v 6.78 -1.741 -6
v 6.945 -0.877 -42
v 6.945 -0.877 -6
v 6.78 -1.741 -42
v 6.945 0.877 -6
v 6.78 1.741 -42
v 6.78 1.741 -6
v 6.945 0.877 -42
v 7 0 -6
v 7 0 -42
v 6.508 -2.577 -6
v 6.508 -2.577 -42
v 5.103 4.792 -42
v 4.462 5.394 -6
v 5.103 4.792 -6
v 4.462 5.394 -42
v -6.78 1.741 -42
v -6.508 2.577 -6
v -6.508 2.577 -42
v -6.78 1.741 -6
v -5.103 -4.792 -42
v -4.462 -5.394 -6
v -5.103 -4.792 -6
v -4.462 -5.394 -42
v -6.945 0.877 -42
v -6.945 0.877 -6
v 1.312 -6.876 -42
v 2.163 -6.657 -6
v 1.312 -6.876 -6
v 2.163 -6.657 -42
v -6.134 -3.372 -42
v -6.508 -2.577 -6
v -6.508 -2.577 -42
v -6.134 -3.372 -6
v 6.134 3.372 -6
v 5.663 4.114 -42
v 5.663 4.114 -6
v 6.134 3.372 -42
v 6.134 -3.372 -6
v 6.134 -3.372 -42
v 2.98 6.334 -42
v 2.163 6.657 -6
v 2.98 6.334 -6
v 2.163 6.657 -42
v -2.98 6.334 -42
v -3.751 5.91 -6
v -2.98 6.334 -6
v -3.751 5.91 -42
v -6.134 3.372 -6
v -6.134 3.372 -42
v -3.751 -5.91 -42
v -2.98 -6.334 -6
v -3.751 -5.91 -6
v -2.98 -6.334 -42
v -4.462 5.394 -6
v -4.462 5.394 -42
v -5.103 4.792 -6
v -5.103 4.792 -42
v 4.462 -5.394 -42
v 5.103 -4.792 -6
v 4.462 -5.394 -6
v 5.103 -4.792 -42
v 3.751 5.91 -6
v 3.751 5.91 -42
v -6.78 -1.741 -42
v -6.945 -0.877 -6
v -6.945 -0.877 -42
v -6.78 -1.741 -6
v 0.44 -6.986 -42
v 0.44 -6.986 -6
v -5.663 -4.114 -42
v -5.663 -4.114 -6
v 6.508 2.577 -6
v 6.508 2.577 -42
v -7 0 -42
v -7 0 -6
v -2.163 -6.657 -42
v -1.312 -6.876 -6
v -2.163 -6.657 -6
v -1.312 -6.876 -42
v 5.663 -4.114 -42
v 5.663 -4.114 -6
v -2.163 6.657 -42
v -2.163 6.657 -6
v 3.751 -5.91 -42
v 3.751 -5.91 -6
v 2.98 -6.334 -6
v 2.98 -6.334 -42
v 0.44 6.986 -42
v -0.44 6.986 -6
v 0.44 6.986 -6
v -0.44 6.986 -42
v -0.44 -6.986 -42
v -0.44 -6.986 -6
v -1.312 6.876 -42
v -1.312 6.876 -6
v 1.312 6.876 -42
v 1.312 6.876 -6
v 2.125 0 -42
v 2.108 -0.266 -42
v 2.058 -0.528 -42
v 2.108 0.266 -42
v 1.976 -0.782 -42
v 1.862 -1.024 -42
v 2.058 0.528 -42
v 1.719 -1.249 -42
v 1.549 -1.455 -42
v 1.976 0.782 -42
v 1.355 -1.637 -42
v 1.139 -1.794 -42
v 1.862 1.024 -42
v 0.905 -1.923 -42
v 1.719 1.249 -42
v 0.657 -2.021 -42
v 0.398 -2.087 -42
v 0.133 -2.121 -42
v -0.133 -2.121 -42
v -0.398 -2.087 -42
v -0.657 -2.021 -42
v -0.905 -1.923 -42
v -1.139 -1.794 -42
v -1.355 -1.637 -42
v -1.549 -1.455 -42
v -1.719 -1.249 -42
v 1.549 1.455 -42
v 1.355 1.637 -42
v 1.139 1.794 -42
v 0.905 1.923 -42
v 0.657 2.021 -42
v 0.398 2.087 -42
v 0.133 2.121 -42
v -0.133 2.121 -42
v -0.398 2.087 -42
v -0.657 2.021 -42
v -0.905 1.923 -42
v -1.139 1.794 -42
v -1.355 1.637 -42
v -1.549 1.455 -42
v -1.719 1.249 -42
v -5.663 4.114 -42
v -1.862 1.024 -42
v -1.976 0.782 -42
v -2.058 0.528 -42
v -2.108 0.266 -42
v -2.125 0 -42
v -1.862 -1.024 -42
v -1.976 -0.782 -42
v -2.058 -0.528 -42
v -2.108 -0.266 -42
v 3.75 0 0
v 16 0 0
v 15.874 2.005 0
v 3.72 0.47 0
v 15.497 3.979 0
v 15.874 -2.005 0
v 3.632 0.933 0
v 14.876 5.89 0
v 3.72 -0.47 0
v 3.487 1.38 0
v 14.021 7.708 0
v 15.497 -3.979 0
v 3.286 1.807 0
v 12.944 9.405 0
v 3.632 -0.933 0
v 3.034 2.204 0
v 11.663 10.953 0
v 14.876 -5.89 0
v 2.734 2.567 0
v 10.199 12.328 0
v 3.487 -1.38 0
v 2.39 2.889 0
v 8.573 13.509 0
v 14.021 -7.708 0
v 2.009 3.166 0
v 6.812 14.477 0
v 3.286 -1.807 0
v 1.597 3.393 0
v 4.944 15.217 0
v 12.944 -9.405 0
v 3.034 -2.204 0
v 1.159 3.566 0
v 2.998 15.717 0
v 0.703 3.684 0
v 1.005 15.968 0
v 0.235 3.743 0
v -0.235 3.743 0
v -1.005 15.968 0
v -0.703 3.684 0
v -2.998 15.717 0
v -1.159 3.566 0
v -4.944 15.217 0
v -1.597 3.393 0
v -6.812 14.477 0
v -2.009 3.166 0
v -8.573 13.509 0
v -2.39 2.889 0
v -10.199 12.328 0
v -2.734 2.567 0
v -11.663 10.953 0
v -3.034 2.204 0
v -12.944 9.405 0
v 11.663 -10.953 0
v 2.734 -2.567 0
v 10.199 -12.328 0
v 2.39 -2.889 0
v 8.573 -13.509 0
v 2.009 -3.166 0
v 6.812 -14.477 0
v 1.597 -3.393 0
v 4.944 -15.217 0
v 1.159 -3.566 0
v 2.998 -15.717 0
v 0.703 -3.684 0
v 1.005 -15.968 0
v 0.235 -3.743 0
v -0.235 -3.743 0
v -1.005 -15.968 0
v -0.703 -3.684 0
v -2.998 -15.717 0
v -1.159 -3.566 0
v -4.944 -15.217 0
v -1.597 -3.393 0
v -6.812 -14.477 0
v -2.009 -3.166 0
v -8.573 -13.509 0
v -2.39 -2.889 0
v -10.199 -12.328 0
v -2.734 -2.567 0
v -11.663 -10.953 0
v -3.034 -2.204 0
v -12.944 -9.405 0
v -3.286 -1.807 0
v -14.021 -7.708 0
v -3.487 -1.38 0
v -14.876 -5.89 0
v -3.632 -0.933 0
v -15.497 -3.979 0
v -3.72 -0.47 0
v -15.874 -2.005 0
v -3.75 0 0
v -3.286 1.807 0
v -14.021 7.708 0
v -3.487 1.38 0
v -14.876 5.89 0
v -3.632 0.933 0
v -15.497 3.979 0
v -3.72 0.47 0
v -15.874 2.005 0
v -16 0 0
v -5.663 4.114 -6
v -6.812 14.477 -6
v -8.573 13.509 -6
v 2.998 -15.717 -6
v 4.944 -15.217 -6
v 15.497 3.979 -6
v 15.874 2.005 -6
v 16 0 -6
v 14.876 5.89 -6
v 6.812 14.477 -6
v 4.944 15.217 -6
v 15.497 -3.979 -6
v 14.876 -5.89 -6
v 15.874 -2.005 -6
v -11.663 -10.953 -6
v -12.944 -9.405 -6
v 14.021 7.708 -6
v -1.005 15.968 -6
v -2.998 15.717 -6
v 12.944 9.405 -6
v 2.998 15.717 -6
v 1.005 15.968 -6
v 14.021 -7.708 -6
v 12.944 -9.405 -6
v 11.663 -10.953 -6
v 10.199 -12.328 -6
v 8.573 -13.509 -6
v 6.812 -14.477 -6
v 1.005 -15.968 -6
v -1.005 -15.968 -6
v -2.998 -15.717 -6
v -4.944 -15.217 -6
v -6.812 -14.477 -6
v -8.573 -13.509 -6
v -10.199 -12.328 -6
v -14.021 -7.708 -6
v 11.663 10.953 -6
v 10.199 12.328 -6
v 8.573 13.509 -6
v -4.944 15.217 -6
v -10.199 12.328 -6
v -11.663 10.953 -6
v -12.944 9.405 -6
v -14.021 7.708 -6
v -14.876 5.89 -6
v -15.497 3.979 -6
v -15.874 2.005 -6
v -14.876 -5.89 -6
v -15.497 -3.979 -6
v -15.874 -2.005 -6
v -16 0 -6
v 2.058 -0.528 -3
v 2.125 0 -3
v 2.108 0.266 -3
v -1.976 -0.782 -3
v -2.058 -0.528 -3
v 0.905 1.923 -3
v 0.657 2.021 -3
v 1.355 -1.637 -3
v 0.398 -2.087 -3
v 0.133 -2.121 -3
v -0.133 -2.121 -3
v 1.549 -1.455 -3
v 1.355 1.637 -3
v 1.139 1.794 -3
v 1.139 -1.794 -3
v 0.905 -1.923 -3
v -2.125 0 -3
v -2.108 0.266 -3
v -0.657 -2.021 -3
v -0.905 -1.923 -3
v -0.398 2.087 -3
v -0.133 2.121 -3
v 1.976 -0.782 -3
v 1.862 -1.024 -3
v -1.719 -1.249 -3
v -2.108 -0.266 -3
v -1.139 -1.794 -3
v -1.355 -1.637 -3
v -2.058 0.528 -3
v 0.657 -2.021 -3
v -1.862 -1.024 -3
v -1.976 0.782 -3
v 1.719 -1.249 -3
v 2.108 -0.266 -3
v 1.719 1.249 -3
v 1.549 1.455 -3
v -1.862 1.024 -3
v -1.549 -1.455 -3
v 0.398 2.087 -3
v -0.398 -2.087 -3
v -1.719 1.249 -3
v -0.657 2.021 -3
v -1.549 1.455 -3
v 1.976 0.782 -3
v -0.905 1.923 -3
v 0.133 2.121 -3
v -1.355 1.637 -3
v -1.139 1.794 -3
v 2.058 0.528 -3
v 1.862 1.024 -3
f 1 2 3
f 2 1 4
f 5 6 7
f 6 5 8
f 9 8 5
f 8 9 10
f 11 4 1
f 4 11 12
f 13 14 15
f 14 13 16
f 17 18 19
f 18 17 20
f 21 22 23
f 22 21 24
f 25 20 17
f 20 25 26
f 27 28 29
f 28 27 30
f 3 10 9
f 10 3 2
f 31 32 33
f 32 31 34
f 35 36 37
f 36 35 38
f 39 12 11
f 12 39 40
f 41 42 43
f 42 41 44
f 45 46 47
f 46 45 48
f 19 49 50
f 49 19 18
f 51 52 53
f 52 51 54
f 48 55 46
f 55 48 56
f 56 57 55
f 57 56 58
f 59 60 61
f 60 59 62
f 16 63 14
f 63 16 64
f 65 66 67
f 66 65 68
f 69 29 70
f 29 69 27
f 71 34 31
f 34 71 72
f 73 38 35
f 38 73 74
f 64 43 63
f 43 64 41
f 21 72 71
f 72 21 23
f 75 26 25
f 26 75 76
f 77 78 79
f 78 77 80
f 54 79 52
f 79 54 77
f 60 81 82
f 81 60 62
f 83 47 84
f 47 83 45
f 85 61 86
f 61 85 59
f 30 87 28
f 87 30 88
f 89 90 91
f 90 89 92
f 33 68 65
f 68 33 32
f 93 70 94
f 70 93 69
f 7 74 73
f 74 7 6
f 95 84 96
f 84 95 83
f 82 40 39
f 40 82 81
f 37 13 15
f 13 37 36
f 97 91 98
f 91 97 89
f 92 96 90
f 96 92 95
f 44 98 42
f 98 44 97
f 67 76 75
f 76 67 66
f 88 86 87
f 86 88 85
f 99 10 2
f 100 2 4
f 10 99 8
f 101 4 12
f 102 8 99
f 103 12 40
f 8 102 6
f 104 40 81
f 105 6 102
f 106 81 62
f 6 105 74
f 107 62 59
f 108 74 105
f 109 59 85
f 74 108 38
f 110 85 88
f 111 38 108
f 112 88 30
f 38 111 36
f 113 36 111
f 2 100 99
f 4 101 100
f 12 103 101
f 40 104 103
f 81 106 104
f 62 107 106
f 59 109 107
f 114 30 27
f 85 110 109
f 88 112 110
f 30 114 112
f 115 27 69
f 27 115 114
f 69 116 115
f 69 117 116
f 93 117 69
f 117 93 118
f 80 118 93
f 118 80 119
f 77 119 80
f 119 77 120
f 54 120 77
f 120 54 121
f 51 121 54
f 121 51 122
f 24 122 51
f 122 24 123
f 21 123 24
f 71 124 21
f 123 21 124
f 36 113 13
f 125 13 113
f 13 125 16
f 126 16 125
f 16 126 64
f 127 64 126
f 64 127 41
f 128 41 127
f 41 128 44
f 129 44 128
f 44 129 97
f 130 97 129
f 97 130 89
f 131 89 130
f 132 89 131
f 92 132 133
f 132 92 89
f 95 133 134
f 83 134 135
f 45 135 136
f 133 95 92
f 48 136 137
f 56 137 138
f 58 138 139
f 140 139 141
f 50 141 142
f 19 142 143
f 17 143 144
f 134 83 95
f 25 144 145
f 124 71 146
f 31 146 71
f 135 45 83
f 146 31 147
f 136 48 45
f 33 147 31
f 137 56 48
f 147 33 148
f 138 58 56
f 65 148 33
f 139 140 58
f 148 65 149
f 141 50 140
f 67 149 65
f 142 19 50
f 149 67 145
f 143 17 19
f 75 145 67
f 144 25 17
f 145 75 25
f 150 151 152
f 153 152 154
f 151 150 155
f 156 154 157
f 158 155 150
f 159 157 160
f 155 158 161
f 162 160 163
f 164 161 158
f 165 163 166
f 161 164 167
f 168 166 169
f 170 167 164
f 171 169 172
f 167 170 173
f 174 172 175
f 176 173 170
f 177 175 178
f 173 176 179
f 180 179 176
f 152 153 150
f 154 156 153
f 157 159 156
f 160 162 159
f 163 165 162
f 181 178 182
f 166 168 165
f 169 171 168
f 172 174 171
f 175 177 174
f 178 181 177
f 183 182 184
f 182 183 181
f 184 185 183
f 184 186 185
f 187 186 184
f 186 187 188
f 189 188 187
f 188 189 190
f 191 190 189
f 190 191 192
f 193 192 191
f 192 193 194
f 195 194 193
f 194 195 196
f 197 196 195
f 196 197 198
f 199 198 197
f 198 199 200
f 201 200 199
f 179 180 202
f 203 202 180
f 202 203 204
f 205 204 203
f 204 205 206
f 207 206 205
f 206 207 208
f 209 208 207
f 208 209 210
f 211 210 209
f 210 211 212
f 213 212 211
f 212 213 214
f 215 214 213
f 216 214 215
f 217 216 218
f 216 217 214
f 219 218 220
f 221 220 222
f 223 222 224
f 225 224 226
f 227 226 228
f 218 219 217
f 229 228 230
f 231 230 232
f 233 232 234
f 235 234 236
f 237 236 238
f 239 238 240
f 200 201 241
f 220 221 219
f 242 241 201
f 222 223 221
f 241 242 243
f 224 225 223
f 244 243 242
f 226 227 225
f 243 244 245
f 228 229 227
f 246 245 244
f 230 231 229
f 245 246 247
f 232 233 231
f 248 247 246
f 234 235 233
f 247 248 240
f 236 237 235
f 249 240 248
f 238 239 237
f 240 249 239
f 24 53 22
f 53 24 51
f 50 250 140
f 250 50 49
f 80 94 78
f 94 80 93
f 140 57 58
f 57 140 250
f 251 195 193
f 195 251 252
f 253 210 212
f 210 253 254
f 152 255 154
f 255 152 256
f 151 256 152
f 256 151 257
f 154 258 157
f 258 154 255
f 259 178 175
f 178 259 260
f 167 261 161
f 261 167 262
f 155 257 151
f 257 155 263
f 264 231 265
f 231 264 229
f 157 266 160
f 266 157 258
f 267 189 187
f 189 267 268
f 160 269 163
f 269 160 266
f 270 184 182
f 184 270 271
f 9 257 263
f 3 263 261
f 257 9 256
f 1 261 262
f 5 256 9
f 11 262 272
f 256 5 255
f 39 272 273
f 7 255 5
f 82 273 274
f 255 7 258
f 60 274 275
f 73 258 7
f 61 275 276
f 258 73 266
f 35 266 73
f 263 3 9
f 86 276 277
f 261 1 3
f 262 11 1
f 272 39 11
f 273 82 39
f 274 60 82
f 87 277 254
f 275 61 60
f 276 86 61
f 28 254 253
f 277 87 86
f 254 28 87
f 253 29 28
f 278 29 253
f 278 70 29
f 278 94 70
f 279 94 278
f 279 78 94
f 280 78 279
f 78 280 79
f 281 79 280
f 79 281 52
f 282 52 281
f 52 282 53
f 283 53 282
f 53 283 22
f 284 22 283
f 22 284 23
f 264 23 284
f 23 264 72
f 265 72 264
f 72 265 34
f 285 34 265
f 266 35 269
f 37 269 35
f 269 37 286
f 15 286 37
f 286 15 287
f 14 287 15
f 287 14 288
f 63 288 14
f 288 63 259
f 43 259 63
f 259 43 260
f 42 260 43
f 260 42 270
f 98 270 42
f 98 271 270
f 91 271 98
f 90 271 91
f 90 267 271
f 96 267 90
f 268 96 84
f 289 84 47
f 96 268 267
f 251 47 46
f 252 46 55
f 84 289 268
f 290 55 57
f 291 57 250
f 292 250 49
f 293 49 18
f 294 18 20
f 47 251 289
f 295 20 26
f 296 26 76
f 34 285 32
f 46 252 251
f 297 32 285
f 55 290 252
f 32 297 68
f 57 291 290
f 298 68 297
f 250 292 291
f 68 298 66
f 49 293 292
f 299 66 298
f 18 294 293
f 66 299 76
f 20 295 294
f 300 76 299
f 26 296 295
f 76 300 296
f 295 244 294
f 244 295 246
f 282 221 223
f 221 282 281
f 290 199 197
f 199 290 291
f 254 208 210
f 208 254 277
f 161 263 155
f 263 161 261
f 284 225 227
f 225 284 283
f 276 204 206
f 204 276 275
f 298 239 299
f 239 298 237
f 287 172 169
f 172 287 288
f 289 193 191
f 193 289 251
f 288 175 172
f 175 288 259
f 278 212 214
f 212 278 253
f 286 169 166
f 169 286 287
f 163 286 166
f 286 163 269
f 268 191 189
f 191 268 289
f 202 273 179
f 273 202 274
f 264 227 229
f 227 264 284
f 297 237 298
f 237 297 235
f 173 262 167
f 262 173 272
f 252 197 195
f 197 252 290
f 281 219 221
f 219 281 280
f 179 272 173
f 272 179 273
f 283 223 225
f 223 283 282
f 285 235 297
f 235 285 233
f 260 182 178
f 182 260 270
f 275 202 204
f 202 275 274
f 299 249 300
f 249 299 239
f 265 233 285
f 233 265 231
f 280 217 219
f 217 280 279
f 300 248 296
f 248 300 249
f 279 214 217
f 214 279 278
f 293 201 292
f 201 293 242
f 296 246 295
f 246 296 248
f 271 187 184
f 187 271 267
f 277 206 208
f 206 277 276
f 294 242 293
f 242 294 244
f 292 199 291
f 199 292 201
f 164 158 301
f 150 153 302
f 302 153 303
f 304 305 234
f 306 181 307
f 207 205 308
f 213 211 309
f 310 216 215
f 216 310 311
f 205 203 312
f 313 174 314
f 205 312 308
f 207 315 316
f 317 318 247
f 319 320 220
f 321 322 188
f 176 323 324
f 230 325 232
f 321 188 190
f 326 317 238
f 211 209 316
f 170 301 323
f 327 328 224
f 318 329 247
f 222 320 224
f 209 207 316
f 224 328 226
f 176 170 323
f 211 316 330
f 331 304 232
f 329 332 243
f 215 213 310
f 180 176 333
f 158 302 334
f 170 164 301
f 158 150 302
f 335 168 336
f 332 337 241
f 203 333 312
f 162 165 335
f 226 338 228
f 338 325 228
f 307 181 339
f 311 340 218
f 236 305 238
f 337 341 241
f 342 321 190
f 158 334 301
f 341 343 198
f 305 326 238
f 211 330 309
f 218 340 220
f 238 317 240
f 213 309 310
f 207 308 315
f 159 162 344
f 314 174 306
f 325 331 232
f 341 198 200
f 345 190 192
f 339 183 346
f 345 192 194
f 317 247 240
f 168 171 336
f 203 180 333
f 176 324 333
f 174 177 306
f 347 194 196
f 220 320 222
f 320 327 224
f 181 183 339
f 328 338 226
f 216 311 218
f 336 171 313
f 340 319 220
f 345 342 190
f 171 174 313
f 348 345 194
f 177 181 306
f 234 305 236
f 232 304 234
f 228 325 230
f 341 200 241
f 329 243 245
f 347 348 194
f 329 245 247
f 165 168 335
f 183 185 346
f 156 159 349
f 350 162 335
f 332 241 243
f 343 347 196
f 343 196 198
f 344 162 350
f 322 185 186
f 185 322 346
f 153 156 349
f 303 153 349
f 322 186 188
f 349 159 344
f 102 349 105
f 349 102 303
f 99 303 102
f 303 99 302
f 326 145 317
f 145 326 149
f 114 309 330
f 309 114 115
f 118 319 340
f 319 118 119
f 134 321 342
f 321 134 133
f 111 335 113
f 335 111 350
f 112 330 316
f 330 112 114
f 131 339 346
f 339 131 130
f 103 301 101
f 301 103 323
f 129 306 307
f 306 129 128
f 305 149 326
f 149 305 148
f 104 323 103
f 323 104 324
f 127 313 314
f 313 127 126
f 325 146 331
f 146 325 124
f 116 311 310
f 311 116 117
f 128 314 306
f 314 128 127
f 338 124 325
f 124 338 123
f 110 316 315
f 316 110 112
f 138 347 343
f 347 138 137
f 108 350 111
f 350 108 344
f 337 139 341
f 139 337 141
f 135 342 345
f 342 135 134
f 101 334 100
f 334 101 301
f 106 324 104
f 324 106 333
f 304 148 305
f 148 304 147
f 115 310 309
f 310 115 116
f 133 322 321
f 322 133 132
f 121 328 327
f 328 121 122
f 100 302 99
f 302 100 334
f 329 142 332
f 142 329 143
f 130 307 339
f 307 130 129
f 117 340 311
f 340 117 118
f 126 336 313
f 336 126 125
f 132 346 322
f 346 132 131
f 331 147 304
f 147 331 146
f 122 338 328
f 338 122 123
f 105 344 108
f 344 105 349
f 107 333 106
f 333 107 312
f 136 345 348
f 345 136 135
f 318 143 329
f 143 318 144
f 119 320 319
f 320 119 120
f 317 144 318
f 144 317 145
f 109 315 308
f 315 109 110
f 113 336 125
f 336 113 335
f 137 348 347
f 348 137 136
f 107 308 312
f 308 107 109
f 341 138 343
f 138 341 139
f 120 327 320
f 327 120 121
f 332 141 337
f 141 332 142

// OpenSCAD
$fn = 50;


difference() {
	union() {
		translate(v = [0, 0, -42.0000000000]) {
			cylinder(h = 42, r = 7.0000000000);
		}
		translate(v = [0, 0, -6.0000000000]) {
			cylinder(h = 6, r = 16.0000000000);
		}
	}
	union() {
		translate(v = [0, 0, 0]) {
			rotate(a = [0, 0, 0]) {
				difference() {
					union() {
						#translate(v = [0, 0, -42.0000000000]) {
							cylinder(h = 42, r = 2.0000000000);
						}
						#translate(v = [0, 0, -3]) {
							cylinder(h = 3, r = 7.0000000000, r1 = 2.1250000000, r2 = 3.7500000000);
						}
						#translate(v = [0, 0, -42.0000000000]) {
							cylinder(h = 42, r = 2.1250000000);
						}
						#translate(v = [0, 0, -42.0000000000]) {
							cylinder(h = 42, r = 2.0000000000);
						}
					}
					union();
				}
			}
		}
	}
}
